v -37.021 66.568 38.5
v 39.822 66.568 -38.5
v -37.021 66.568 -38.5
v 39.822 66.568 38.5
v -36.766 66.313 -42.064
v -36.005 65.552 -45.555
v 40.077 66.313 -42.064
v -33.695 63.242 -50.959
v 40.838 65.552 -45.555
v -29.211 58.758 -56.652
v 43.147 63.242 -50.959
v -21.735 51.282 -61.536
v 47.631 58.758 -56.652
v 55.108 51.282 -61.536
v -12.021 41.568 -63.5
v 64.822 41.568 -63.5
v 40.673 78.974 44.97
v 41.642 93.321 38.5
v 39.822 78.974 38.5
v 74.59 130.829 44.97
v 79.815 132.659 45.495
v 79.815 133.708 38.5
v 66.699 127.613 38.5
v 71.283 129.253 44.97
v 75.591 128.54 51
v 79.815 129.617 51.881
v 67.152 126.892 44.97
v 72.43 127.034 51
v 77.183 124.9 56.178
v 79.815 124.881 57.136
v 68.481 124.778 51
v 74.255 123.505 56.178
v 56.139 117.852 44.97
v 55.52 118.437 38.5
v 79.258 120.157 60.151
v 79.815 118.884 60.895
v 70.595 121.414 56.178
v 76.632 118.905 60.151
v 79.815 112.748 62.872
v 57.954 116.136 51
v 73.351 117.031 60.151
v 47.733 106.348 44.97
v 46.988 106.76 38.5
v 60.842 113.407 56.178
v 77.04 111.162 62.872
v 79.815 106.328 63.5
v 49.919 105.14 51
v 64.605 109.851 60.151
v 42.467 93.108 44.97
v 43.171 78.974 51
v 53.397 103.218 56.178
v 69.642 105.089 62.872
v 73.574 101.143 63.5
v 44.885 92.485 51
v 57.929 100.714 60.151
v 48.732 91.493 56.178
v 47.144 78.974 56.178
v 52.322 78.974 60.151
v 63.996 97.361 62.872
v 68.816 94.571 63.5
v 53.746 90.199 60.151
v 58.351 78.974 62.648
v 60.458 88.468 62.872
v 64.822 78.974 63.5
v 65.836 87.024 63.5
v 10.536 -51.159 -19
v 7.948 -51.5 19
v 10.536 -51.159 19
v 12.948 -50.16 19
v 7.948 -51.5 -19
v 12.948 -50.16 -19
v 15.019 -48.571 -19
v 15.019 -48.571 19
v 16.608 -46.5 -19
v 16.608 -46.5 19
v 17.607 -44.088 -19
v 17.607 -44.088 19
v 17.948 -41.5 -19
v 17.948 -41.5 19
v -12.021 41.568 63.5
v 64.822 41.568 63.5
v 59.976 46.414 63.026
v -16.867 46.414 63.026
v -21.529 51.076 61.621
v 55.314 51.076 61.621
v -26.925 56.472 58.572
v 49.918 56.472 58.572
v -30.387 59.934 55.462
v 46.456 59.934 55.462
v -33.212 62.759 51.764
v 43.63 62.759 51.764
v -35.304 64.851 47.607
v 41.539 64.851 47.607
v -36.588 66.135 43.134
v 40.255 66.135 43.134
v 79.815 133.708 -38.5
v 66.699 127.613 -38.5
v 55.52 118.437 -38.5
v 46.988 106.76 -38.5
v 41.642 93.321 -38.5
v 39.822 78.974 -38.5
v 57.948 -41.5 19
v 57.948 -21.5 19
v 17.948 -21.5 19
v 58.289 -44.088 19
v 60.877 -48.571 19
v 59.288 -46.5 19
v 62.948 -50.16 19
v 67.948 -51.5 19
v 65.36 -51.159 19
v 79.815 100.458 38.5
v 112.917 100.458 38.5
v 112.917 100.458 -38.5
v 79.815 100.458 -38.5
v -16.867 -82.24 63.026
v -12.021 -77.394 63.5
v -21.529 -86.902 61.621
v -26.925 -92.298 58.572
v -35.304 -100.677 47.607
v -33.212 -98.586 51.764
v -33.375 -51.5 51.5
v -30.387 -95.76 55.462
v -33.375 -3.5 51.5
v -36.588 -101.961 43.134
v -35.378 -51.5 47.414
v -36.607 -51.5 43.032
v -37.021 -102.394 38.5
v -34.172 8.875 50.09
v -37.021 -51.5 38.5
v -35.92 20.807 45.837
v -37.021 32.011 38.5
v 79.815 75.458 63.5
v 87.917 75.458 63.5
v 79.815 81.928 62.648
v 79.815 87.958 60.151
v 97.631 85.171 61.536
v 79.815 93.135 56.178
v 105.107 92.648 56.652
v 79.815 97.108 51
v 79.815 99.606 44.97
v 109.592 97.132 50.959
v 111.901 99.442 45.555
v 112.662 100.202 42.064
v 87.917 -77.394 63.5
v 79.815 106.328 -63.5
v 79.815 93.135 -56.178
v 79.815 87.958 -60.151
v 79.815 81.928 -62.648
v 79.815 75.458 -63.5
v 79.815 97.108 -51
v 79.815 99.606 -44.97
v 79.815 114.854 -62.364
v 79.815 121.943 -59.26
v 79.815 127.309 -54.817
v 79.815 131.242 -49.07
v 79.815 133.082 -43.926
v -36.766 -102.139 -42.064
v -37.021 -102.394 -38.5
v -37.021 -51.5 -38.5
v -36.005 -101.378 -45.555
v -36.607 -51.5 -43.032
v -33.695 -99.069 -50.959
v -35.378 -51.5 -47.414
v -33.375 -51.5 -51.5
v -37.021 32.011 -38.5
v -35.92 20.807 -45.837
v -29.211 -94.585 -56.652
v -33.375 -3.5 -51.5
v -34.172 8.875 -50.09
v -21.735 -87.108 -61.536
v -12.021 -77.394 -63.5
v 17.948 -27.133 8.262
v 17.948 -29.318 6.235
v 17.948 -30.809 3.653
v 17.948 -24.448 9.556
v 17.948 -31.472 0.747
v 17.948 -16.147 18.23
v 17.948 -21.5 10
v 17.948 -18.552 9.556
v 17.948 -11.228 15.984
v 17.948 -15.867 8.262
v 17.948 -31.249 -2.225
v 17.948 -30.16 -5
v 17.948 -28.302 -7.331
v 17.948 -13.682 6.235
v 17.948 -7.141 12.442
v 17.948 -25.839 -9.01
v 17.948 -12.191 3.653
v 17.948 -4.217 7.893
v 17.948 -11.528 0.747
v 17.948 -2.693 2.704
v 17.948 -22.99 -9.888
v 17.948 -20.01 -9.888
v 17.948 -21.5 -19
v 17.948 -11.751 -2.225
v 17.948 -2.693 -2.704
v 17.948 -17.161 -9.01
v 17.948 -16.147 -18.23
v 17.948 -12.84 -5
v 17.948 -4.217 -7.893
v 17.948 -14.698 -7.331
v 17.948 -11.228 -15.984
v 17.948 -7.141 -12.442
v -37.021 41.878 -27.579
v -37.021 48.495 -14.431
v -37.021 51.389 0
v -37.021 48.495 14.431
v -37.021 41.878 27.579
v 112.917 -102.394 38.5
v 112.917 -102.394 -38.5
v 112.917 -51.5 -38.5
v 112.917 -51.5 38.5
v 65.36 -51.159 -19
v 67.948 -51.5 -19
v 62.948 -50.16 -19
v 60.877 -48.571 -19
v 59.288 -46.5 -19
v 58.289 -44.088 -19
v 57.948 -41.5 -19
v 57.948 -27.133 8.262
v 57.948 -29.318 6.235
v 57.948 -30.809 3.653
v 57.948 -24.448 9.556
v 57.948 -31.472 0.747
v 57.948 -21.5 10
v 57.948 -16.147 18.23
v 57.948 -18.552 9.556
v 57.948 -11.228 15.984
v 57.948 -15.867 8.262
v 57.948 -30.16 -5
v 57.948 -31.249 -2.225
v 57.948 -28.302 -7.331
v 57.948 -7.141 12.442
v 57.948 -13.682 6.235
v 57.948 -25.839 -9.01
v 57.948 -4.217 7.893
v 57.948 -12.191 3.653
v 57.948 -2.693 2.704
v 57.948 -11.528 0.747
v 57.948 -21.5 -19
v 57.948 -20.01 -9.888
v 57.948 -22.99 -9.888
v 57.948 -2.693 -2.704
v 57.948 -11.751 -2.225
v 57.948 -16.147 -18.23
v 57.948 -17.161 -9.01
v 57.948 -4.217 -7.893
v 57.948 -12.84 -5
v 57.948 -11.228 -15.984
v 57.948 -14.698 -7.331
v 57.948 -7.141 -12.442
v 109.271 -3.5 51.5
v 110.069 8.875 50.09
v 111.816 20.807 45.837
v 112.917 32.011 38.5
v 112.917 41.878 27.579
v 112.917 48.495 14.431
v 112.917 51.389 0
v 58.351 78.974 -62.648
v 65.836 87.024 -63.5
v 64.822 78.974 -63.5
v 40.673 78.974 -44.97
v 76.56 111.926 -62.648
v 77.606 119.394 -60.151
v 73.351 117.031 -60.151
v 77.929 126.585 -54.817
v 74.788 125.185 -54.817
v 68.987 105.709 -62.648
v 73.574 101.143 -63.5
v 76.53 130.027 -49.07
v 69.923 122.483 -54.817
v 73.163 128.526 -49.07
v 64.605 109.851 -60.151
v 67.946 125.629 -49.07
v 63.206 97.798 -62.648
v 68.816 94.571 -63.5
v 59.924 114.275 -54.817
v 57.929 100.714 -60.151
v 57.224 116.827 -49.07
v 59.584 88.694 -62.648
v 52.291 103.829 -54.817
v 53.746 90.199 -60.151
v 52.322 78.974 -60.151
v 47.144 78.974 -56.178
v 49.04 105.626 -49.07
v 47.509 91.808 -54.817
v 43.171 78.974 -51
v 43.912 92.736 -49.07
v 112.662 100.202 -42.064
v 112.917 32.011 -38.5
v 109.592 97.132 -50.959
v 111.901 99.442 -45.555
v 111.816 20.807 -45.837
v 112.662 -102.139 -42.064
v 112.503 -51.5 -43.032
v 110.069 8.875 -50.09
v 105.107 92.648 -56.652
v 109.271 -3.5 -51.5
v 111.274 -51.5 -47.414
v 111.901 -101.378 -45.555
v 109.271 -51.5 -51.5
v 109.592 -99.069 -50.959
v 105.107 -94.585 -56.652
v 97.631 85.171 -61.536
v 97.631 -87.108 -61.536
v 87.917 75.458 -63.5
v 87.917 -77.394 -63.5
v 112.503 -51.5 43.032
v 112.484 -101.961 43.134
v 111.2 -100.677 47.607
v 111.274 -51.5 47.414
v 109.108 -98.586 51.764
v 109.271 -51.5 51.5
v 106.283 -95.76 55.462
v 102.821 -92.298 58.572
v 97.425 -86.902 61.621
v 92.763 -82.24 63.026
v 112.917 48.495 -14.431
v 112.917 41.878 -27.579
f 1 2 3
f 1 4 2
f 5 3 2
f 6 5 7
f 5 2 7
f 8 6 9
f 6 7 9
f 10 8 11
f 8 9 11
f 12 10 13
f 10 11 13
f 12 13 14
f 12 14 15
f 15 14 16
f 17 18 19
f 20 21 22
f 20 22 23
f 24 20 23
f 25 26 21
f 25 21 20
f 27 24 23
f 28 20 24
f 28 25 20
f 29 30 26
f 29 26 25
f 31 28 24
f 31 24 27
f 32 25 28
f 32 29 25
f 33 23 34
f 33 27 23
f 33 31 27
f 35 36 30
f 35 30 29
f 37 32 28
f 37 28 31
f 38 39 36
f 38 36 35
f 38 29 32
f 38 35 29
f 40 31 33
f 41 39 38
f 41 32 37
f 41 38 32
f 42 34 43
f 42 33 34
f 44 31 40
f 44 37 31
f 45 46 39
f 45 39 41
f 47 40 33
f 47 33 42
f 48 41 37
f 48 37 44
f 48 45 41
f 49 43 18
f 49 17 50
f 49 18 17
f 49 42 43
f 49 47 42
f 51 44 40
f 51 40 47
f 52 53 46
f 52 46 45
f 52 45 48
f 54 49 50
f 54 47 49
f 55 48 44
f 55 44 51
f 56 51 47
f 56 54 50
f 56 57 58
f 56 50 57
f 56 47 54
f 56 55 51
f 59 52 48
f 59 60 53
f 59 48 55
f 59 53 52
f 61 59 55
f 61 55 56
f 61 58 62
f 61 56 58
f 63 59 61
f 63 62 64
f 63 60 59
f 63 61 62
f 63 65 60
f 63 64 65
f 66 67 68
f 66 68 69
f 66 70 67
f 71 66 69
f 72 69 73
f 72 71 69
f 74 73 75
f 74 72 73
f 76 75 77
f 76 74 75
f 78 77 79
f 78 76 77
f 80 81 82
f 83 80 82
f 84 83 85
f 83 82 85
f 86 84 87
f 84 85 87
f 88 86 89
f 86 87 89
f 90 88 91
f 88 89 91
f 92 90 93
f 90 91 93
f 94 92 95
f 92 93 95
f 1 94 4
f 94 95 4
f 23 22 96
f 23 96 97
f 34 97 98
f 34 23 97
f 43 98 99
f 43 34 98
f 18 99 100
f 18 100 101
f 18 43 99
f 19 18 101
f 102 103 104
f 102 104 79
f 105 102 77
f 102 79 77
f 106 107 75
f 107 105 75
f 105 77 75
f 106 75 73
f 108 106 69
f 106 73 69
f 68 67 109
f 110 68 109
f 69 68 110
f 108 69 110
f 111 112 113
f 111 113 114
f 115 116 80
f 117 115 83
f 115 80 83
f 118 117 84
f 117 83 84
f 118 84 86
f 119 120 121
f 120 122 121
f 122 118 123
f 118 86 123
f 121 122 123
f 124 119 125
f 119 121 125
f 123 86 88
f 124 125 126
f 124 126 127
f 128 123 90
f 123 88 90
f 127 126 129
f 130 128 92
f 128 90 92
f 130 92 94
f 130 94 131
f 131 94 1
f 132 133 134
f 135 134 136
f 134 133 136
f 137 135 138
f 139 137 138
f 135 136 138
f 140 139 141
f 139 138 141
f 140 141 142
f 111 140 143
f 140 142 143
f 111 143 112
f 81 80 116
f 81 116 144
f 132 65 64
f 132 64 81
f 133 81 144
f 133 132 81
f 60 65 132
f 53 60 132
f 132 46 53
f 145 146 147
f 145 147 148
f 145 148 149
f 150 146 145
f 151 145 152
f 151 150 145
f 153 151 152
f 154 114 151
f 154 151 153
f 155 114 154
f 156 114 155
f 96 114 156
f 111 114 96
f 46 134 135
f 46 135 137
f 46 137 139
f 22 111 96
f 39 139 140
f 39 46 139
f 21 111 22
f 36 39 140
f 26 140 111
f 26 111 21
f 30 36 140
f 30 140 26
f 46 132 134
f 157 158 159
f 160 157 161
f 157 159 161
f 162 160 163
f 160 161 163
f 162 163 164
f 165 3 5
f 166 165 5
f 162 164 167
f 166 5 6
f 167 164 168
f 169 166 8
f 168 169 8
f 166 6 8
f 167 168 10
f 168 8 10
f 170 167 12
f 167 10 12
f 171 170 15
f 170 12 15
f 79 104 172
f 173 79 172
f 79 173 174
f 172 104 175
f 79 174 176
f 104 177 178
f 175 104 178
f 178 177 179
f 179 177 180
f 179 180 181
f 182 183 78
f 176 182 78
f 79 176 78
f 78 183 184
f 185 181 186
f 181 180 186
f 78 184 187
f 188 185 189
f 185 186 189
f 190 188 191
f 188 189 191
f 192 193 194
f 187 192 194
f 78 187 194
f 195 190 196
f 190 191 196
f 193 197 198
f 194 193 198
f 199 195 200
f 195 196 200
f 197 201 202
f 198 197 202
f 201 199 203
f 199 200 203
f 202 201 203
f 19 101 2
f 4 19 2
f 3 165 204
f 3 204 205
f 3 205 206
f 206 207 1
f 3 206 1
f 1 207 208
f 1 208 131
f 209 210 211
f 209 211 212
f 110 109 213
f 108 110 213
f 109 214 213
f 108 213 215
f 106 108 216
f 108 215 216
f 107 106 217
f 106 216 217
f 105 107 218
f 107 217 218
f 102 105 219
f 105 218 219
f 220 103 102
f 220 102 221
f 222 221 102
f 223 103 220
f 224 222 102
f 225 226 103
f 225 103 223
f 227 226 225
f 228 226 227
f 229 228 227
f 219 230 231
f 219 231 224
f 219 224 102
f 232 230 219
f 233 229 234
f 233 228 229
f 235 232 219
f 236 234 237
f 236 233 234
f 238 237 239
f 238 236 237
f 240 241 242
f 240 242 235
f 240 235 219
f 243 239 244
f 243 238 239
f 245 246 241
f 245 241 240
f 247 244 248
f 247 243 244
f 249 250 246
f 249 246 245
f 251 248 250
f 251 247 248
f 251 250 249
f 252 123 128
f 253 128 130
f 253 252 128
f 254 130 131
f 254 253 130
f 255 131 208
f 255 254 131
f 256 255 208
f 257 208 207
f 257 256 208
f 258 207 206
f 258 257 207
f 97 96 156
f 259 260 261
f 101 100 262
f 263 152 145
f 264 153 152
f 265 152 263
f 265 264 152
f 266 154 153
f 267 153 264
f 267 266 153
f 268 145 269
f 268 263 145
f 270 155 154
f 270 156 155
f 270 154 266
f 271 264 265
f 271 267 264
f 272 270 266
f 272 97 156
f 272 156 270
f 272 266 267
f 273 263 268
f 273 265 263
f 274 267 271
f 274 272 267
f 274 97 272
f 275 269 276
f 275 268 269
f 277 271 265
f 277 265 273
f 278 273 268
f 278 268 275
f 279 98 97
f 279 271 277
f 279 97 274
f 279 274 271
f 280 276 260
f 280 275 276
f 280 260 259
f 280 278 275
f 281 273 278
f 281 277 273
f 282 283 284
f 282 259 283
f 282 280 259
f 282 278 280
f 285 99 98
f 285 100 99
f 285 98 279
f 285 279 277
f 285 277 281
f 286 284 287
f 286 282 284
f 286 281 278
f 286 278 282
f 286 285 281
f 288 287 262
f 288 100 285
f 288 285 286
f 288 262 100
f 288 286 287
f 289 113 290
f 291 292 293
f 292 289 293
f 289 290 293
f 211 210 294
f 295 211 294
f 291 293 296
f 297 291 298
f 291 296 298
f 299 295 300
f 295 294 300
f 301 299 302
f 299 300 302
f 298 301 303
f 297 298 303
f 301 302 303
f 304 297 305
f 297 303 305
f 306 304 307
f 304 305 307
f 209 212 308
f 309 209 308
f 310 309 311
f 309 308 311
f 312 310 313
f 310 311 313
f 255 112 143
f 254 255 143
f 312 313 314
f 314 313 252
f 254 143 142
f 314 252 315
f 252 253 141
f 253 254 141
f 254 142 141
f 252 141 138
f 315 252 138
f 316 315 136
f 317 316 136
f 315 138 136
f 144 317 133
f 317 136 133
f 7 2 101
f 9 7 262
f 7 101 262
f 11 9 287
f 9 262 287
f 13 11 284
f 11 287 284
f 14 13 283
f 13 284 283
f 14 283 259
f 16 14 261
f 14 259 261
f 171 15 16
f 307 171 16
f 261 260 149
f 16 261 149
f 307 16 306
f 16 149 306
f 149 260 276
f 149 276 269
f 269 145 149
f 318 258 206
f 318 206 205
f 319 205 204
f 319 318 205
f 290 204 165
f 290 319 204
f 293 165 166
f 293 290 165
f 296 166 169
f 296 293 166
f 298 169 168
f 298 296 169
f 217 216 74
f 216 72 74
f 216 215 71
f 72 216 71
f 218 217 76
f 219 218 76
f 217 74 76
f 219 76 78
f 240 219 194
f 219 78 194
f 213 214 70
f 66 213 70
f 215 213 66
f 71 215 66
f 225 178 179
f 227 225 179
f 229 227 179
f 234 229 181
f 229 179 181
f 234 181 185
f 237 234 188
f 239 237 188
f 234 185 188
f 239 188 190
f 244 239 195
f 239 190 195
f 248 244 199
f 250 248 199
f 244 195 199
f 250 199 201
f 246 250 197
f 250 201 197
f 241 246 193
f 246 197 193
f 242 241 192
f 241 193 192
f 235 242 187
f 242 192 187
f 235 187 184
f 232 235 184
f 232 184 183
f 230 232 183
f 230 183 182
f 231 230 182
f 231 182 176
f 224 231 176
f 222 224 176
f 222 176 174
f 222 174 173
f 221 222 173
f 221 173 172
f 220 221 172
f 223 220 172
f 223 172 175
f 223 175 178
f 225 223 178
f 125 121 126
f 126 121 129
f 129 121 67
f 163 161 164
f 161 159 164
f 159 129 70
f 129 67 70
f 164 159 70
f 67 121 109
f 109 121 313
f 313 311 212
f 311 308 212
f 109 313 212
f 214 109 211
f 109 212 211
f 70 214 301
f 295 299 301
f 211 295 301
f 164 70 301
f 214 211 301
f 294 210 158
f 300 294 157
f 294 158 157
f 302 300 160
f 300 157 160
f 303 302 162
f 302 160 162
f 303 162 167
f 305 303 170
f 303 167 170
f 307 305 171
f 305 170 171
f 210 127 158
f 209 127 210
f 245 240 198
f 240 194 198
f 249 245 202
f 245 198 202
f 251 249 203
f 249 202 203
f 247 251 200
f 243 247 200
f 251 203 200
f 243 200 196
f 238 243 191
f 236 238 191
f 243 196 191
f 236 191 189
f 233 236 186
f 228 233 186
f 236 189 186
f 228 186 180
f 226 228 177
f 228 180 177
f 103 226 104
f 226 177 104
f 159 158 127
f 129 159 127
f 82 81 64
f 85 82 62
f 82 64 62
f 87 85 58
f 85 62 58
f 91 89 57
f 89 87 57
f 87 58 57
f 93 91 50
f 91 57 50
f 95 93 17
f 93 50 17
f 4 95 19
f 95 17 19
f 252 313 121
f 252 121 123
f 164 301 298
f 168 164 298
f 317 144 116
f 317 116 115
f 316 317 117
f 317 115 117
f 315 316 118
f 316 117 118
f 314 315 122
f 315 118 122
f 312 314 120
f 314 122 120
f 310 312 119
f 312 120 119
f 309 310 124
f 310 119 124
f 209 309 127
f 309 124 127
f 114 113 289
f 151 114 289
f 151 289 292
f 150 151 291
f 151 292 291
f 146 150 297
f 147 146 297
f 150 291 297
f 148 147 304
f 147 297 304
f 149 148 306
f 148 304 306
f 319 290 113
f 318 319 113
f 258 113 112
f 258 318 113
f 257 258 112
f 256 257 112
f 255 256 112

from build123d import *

# Parameters (mm, degrees)
BOSS_EXTRUDE1_DEPTH = 63.5
SKETCH3_W           = 103
SKETCH3_H           = 103
CUT_EXTRUDE1_DEPTH  = 211.692895559
BOSS_EXTRUDE2_DEPTH = 20
FILLET1_R           = 55
SKETCH6_R           = 10
CUT_EXTRUDE2_DEPTH  = 176.866755526
FILLET2_R           = 10
FILLET3_R           = 25


with BuildPart() as part:
    # Sketch2 → Boss-Extrude1 (new, symmetric)
    with BuildSketch(Plane.XY):
        with BuildLine():
            Line((-37.021158778, -102.394460884), (112.91726901, -102.394460884))
            Line((112.91726901, -102.394460884), (112.91726901, 63.318112544))
            Line((112.91726901, 63.318112544), (112.91726901, 100.457569387))
            Line((112.91726901, 100.457569387), (79.814777063, 100.457569387))
            Line((79.814777063, 100.457569387), (79.814777063, 133.707569387))
            ThreePointArc((79.814777063, 133.707569387), (50.885133933, 112.867809308), (39.821527553, 78.973614146))
            Line((39.821527553, 78.973614146), (39.821527553, 66.568112544))
            Line((39.821527553, 66.568112544), (-37.021158778, 66.568112544))
            Line((-37.021158778, 66.568112544), (-37.021158778, -102.394460884))
        make_face()
    extrude(amount=BOSS_EXTRUDE1_DEPTH, both=True)

    # Sketch3 → Cut-Extrude1 (cut, through all)
    with BuildSketch(Plane(origin=(112.91726901, 0, 0), x_dir=(0, 0, -1), z_dir=(1, 0, 0))):
        Rectangle(SKETCH3_W, SKETCH3_H)
    extrude(amount=-CUT_EXTRUDE1_DEPTH, mode=Mode.SUBTRACT)

    # Sketch5 → Boss-Extrude2 (add, symmetric)
    with BuildSketch(Plane.ZY.offset(-37.948055116)):
        with BuildLine():
            Line((19, -51.5), (-19, -51.5))
            Line((-19, -51.5), (-19, -21.5))
            ThreePointArc((-19, -21.5), (0, -2.5), (19, -21.5))
            Line((19, -21.5), (19, -51.5))
        make_face()
    extrude(amount=BOSS_EXTRUDE2_DEPTH, both=True)

    # Fillet1
    # the kernel refuses this fillet: 55 mm, written as the material it adds along each edge
    with BuildSketch(Plane(origin=(112.91726901, 51.5, 51.5), x_dir=(0, 0, -1), z_dir=(-1, 0, 0))) as fillet1_piece_1:
        with BuildLine():
            CenterArc((FILLET1_R, FILLET1_R), FILLET1_R, 180, 90)
            Line((0, FILLET1_R), (0, 0))
            Line((0, 0), (FILLET1_R, 0))
        make_face()
    extrude(amount=149.938427788)
    with BuildSketch(Plane(origin=(112.91726901, 51.5, -51.5), x_dir=(0, 0, 1), z_dir=(-1, 0, 0))) as fillet1_piece_2:
        with BuildLine():
            CenterArc((FILLET1_R, -FILLET1_R), FILLET1_R, 90, 90)
            Line((0, -FILLET1_R), (0, 0))
            Line((0, 0), (FILLET1_R, 0))
        make_face()
    extrude(amount=149.938427788)

    # Sketch6 → Cut-Extrude2 (cut, through all)
    with BuildSketch(Plane.ZY.offset(-17.948055116)):
        with Locations((0, -21.5)):
            Circle(SKETCH6_R)
    extrude(amount=-CUT_EXTRUDE2_DEPTH, mode=Mode.SUBTRACT)

    # Fillet2
    fillet2_edges = [part.edges().sort_by_distance(p)[0] for p in [
        (57.948055116, -51.5, 0),
        (17.948055116, -51.5, 0),
    ]]
    fillet(fillet2_edges, radius=FILLET2_R)

    # Fillet3
    # the kernel refuses this fillet: 25 mm, written as the material it takes off along each edge
    with BuildSketch(Plane(origin=(39.821527553, 78.973614146, -63.5), x_dir=(0, 0, 1), z_dir=(0, -1, 0)), Plane(origin=(39.821527553, 78.973614146, 63.5), x_dir=(1, 0, 0), z_dir=(0, -1, 0))) as fillet3_piece_1:
        with BuildLine():
            CenterArc((FILLET3_R, -FILLET3_R), FILLET3_R, 90, 90)
            Line((0, -FILLET3_R), (0, 0))
            Line((0, 0), (FILLET3_R, 0))
        make_face()
    extrude(amount=12.405501602, mode=Mode.SUBTRACT)
    with BuildSketch(Plane(origin=(97.272046317, 78.973614146, -63.5), x_dir=(0.7028717188946543, 0.711316629060557, 0), z_dir=(0.711316629060557, -0.7028717188946543, 0))) as fillet3_piece_2:
        with BuildLine():
            CenterArc((57.450518764 - FILLET3_R, FILLET3_R), FILLET3_R, 270, 90)
            Line((57.450518764 - FILLET3_R, 0), (57.450518764, 0))
            Line((57.450518764, 0), (57.450518764, FILLET3_R))
        make_face()
    revolve(axis=Axis((97.272046317, 78.973614146, -63.5), (0, 0, 1)), revolution_arc=134.657858898, mode=Mode.SUBTRACT)
    with BuildSketch(Plane(origin=(-99.521158778, -102.394460884, 63.5), x_dir=(0, 0, -1), z_dir=(1, 0, 0))) as fillet3_piece_3:
        with BuildLine():
            CenterArc((FILLET3_R, FILLET3_R), FILLET3_R, 180, 90)
            Line((0, FILLET3_R), (0, 0))
            Line((0, 0), (FILLET3_R, 0))
        make_face()
    extrude(amount=274.938427788, mode=Mode.SUBTRACT)
    with BuildSketch(Plane(origin=(97.272046317, 78.973614146, 63.5), x_dir=(0.7028717188946543, 0.711316629060557, 0), z_dir=(0.711316629060557, -0.7028717188946543, 0))) as fillet3_piece_4:
        with BuildLine():
            CenterArc((57.450518764 - FILLET3_R, -FILLET3_R), FILLET3_R, 0, 90)
            Line((57.450518764, -FILLET3_R), (57.450518764, 0))
            Line((57.450518764, 0), (57.450518764 - FILLET3_R, 0))
        make_face()
    revolve(axis=Axis((97.272046317, 78.973614146, 63.5), (0, 0, 1)), revolution_arc=134.657858898, mode=Mode.SUBTRACT)
    with BuildSketch(Plane(origin=(39.821527553, 66.568112544, 63.5), x_dir=(0, -1, 0), z_dir=(-1, 0, 0)), Plane(origin=(39.821527553, 66.568112544, -63.5), x_dir=(0, 0, 1), z_dir=(-1, 0, 0))) as fillet3_piece_5:
        with BuildLine():
            CenterArc((FILLET3_R, -FILLET3_R), FILLET3_R, 90, 90)
            Line((0, -FILLET3_R), (0, 0))
            Line((0, 0), (FILLET3_R, 0))
        make_face()
    extrude(amount=139.342686331, mode=Mode.SUBTRACT)
    with BuildSketch(Plane(origin=(-37.021158778, 129.068112544, 63.5), x_dir=(0, 0, -1), z_dir=(0, -1, 0))) as fillet3_piece_6:
        with BuildLine():
            CenterArc((FILLET3_R, FILLET3_R), FILLET3_R, 180, 90)
            Line((0, FILLET3_R), (0, 0))
            Line((0, 0), (FILLET3_R, 0))
        make_face()
    extrude(amount=293.962573428, mode=Mode.SUBTRACT)
    with BuildSketch(Plane(origin=(112.91726901, 162.957569387, 63.5), x_dir=(-1, 0, 0), z_dir=(0, -1, 0)), Plane(origin=(112.91726901, -164.894460884, -63.5), x_dir=(-1, 0, 0), z_dir=(0, 1, 0))) as fillet3_piece_7:
        with BuildLine():
            CenterArc((FILLET3_R, FILLET3_R), FILLET3_R, 180, 90)
            Line((0, FILLET3_R), (0, 0))
            Line((0, 0), (FILLET3_R, 0))
        make_face()
    extrude(amount=327.852030272, mode=Mode.SUBTRACT)
    with BuildSketch(Plane(origin=(-99.521158778, -102.394460884, -63.5), x_dir=(0, 0, 1), z_dir=(1, 0, 0))) as fillet3_piece_8:
        with BuildLine():
            CenterArc((FILLET3_R, -FILLET3_R), FILLET3_R, 90, 90)
            Line((0, -FILLET3_R), (0, 0))
            Line((0, 0), (FILLET3_R, 0))
        make_face()
    extrude(amount=274.938427788, mode=Mode.SUBTRACT)
    with BuildSketch(Plane(origin=(-37.021158778, 129.068112544, -63.5), x_dir=(0, 0, 1), z_dir=(0, -1, 0))) as fillet3_piece_9:
        with BuildLine():
            CenterArc((FILLET3_R, -FILLET3_R), FILLET3_R, 90, 90)
            Line((0, -FILLET3_R), (0, 0))
            Line((0, 0), (FILLET3_R, 0))
        make_face()
    extrude(amount=293.962573428, mode=Mode.SUBTRACT)
    with BuildSketch(Plane(origin=(175.41726901, 100.457569387, -63.5), x_dir=(0, 0, 1), z_dir=(-1, 0, 0)), Plane(origin=(175.41726901, 100.457569387, 63.5), x_dir=(0, -1, 0), z_dir=(-1, 0, 0))) as fillet3_piece_10:
        with BuildLine():
            CenterArc((FILLET3_R, -FILLET3_R), FILLET3_R, 90, 90)
            Line((0, -FILLET3_R), (0, 0))
            Line((0, 0), (FILLET3_R, 0))
        make_face()
    extrude(amount=95.602491947, mode=Mode.SUBTRACT)
    with BuildSketch(Plane(origin=(39.821527553, 78.973614146, -63.5), x_dir=(0, 0, 1), z_dir=(0, -1, 0))) as fillet3_piece_11a_section:
        with BuildLine():
            CenterArc((FILLET3_R, -FILLET3_R), FILLET3_R, 90, 90)
            Line((0, -FILLET3_R), (0, 0))
            Line((0, 0), (FILLET3_R, 0))
        make_face()
    fillet3_piece_11a = extrude(amount=74.905501602, mode=Mode.PRIVATE)
    fillet3_piece_11a = split(fillet3_piece_11a, bisect_by=Plane(origin=(45.48140541, 66.568112544, -57.840122143), z_dir=(0, -1, 0)), keep=Keep.TOP, mode=Mode.PRIVATE)
    with BuildSketch(Plane(origin=(102.321527553, 66.568112544, -63.5), x_dir=(0, 0, 1), z_dir=(-1, 0, 0))) as fillet3_piece_11b_section:
        with BuildLine():
            CenterArc((FILLET3_R, -FILLET3_R), FILLET3_R, 90, 90)
            Line((0, -FILLET3_R), (0, 0))
            Line((0, 0), (FILLET3_R, 0))
        make_face()
    fillet3_piece_11b = extrude(amount=201.842686331, mode=Mode.PRIVATE)
    fillet3_piece_11b = split(fillet3_piece_11b, bisect_by=Plane(origin=(39.821527553, 60.908234687, -57.840122143), z_dir=(1, 0, 0)), keep=Keep.TOP, mode=Mode.PRIVATE)
    fillet3_piece_11 = fillet3_piece_11a & fillet3_piece_11b
    add(fillet3_piece_11, mode=Mode.SUBTRACT)
    with BuildSketch(Plane(origin=(39.821527553, 78.973614146, 63.5), x_dir=(1, 0, 0), z_dir=(0, -1, 0))) as fillet3_piece_12a_section:
        with BuildLine():
            CenterArc((FILLET3_R, -FILLET3_R), FILLET3_R, 90, 90)
            Line((0, -FILLET3_R), (0, 0))
            Line((0, 0), (FILLET3_R, 0))
        make_face()
    fillet3_piece_12a = extrude(amount=74.905501602, mode=Mode.PRIVATE)
    fillet3_piece_12a = split(fillet3_piece_12a, bisect_by=Plane(origin=(45.48140541, 66.568112544, 57.840122143), z_dir=(0, -1, 0)), keep=Keep.TOP, mode=Mode.PRIVATE)
    with BuildSketch(Plane(origin=(102.321527553, 66.568112544, 63.5), x_dir=(0, -1, 0), z_dir=(-1, 0, 0))) as fillet3_piece_12b_section:
        with BuildLine():
            CenterArc((FILLET3_R, -FILLET3_R), FILLET3_R, 90, 90)
            Line((0, -FILLET3_R), (0, 0))
            Line((0, 0), (FILLET3_R, 0))
        make_face()
    fillet3_piece_12b = extrude(amount=201.842686331, mode=Mode.PRIVATE)
    fillet3_piece_12b = split(fillet3_piece_12b, bisect_by=Plane(origin=(39.821527553, 60.908234687, 57.840122143), z_dir=(1, 0, 0)), keep=Keep.TOP, mode=Mode.PRIVATE)
    fillet3_piece_12 = fillet3_piece_12a & fillet3_piece_12b
    add(fillet3_piece_12, mode=Mode.SUBTRACT)


solid = part.part
